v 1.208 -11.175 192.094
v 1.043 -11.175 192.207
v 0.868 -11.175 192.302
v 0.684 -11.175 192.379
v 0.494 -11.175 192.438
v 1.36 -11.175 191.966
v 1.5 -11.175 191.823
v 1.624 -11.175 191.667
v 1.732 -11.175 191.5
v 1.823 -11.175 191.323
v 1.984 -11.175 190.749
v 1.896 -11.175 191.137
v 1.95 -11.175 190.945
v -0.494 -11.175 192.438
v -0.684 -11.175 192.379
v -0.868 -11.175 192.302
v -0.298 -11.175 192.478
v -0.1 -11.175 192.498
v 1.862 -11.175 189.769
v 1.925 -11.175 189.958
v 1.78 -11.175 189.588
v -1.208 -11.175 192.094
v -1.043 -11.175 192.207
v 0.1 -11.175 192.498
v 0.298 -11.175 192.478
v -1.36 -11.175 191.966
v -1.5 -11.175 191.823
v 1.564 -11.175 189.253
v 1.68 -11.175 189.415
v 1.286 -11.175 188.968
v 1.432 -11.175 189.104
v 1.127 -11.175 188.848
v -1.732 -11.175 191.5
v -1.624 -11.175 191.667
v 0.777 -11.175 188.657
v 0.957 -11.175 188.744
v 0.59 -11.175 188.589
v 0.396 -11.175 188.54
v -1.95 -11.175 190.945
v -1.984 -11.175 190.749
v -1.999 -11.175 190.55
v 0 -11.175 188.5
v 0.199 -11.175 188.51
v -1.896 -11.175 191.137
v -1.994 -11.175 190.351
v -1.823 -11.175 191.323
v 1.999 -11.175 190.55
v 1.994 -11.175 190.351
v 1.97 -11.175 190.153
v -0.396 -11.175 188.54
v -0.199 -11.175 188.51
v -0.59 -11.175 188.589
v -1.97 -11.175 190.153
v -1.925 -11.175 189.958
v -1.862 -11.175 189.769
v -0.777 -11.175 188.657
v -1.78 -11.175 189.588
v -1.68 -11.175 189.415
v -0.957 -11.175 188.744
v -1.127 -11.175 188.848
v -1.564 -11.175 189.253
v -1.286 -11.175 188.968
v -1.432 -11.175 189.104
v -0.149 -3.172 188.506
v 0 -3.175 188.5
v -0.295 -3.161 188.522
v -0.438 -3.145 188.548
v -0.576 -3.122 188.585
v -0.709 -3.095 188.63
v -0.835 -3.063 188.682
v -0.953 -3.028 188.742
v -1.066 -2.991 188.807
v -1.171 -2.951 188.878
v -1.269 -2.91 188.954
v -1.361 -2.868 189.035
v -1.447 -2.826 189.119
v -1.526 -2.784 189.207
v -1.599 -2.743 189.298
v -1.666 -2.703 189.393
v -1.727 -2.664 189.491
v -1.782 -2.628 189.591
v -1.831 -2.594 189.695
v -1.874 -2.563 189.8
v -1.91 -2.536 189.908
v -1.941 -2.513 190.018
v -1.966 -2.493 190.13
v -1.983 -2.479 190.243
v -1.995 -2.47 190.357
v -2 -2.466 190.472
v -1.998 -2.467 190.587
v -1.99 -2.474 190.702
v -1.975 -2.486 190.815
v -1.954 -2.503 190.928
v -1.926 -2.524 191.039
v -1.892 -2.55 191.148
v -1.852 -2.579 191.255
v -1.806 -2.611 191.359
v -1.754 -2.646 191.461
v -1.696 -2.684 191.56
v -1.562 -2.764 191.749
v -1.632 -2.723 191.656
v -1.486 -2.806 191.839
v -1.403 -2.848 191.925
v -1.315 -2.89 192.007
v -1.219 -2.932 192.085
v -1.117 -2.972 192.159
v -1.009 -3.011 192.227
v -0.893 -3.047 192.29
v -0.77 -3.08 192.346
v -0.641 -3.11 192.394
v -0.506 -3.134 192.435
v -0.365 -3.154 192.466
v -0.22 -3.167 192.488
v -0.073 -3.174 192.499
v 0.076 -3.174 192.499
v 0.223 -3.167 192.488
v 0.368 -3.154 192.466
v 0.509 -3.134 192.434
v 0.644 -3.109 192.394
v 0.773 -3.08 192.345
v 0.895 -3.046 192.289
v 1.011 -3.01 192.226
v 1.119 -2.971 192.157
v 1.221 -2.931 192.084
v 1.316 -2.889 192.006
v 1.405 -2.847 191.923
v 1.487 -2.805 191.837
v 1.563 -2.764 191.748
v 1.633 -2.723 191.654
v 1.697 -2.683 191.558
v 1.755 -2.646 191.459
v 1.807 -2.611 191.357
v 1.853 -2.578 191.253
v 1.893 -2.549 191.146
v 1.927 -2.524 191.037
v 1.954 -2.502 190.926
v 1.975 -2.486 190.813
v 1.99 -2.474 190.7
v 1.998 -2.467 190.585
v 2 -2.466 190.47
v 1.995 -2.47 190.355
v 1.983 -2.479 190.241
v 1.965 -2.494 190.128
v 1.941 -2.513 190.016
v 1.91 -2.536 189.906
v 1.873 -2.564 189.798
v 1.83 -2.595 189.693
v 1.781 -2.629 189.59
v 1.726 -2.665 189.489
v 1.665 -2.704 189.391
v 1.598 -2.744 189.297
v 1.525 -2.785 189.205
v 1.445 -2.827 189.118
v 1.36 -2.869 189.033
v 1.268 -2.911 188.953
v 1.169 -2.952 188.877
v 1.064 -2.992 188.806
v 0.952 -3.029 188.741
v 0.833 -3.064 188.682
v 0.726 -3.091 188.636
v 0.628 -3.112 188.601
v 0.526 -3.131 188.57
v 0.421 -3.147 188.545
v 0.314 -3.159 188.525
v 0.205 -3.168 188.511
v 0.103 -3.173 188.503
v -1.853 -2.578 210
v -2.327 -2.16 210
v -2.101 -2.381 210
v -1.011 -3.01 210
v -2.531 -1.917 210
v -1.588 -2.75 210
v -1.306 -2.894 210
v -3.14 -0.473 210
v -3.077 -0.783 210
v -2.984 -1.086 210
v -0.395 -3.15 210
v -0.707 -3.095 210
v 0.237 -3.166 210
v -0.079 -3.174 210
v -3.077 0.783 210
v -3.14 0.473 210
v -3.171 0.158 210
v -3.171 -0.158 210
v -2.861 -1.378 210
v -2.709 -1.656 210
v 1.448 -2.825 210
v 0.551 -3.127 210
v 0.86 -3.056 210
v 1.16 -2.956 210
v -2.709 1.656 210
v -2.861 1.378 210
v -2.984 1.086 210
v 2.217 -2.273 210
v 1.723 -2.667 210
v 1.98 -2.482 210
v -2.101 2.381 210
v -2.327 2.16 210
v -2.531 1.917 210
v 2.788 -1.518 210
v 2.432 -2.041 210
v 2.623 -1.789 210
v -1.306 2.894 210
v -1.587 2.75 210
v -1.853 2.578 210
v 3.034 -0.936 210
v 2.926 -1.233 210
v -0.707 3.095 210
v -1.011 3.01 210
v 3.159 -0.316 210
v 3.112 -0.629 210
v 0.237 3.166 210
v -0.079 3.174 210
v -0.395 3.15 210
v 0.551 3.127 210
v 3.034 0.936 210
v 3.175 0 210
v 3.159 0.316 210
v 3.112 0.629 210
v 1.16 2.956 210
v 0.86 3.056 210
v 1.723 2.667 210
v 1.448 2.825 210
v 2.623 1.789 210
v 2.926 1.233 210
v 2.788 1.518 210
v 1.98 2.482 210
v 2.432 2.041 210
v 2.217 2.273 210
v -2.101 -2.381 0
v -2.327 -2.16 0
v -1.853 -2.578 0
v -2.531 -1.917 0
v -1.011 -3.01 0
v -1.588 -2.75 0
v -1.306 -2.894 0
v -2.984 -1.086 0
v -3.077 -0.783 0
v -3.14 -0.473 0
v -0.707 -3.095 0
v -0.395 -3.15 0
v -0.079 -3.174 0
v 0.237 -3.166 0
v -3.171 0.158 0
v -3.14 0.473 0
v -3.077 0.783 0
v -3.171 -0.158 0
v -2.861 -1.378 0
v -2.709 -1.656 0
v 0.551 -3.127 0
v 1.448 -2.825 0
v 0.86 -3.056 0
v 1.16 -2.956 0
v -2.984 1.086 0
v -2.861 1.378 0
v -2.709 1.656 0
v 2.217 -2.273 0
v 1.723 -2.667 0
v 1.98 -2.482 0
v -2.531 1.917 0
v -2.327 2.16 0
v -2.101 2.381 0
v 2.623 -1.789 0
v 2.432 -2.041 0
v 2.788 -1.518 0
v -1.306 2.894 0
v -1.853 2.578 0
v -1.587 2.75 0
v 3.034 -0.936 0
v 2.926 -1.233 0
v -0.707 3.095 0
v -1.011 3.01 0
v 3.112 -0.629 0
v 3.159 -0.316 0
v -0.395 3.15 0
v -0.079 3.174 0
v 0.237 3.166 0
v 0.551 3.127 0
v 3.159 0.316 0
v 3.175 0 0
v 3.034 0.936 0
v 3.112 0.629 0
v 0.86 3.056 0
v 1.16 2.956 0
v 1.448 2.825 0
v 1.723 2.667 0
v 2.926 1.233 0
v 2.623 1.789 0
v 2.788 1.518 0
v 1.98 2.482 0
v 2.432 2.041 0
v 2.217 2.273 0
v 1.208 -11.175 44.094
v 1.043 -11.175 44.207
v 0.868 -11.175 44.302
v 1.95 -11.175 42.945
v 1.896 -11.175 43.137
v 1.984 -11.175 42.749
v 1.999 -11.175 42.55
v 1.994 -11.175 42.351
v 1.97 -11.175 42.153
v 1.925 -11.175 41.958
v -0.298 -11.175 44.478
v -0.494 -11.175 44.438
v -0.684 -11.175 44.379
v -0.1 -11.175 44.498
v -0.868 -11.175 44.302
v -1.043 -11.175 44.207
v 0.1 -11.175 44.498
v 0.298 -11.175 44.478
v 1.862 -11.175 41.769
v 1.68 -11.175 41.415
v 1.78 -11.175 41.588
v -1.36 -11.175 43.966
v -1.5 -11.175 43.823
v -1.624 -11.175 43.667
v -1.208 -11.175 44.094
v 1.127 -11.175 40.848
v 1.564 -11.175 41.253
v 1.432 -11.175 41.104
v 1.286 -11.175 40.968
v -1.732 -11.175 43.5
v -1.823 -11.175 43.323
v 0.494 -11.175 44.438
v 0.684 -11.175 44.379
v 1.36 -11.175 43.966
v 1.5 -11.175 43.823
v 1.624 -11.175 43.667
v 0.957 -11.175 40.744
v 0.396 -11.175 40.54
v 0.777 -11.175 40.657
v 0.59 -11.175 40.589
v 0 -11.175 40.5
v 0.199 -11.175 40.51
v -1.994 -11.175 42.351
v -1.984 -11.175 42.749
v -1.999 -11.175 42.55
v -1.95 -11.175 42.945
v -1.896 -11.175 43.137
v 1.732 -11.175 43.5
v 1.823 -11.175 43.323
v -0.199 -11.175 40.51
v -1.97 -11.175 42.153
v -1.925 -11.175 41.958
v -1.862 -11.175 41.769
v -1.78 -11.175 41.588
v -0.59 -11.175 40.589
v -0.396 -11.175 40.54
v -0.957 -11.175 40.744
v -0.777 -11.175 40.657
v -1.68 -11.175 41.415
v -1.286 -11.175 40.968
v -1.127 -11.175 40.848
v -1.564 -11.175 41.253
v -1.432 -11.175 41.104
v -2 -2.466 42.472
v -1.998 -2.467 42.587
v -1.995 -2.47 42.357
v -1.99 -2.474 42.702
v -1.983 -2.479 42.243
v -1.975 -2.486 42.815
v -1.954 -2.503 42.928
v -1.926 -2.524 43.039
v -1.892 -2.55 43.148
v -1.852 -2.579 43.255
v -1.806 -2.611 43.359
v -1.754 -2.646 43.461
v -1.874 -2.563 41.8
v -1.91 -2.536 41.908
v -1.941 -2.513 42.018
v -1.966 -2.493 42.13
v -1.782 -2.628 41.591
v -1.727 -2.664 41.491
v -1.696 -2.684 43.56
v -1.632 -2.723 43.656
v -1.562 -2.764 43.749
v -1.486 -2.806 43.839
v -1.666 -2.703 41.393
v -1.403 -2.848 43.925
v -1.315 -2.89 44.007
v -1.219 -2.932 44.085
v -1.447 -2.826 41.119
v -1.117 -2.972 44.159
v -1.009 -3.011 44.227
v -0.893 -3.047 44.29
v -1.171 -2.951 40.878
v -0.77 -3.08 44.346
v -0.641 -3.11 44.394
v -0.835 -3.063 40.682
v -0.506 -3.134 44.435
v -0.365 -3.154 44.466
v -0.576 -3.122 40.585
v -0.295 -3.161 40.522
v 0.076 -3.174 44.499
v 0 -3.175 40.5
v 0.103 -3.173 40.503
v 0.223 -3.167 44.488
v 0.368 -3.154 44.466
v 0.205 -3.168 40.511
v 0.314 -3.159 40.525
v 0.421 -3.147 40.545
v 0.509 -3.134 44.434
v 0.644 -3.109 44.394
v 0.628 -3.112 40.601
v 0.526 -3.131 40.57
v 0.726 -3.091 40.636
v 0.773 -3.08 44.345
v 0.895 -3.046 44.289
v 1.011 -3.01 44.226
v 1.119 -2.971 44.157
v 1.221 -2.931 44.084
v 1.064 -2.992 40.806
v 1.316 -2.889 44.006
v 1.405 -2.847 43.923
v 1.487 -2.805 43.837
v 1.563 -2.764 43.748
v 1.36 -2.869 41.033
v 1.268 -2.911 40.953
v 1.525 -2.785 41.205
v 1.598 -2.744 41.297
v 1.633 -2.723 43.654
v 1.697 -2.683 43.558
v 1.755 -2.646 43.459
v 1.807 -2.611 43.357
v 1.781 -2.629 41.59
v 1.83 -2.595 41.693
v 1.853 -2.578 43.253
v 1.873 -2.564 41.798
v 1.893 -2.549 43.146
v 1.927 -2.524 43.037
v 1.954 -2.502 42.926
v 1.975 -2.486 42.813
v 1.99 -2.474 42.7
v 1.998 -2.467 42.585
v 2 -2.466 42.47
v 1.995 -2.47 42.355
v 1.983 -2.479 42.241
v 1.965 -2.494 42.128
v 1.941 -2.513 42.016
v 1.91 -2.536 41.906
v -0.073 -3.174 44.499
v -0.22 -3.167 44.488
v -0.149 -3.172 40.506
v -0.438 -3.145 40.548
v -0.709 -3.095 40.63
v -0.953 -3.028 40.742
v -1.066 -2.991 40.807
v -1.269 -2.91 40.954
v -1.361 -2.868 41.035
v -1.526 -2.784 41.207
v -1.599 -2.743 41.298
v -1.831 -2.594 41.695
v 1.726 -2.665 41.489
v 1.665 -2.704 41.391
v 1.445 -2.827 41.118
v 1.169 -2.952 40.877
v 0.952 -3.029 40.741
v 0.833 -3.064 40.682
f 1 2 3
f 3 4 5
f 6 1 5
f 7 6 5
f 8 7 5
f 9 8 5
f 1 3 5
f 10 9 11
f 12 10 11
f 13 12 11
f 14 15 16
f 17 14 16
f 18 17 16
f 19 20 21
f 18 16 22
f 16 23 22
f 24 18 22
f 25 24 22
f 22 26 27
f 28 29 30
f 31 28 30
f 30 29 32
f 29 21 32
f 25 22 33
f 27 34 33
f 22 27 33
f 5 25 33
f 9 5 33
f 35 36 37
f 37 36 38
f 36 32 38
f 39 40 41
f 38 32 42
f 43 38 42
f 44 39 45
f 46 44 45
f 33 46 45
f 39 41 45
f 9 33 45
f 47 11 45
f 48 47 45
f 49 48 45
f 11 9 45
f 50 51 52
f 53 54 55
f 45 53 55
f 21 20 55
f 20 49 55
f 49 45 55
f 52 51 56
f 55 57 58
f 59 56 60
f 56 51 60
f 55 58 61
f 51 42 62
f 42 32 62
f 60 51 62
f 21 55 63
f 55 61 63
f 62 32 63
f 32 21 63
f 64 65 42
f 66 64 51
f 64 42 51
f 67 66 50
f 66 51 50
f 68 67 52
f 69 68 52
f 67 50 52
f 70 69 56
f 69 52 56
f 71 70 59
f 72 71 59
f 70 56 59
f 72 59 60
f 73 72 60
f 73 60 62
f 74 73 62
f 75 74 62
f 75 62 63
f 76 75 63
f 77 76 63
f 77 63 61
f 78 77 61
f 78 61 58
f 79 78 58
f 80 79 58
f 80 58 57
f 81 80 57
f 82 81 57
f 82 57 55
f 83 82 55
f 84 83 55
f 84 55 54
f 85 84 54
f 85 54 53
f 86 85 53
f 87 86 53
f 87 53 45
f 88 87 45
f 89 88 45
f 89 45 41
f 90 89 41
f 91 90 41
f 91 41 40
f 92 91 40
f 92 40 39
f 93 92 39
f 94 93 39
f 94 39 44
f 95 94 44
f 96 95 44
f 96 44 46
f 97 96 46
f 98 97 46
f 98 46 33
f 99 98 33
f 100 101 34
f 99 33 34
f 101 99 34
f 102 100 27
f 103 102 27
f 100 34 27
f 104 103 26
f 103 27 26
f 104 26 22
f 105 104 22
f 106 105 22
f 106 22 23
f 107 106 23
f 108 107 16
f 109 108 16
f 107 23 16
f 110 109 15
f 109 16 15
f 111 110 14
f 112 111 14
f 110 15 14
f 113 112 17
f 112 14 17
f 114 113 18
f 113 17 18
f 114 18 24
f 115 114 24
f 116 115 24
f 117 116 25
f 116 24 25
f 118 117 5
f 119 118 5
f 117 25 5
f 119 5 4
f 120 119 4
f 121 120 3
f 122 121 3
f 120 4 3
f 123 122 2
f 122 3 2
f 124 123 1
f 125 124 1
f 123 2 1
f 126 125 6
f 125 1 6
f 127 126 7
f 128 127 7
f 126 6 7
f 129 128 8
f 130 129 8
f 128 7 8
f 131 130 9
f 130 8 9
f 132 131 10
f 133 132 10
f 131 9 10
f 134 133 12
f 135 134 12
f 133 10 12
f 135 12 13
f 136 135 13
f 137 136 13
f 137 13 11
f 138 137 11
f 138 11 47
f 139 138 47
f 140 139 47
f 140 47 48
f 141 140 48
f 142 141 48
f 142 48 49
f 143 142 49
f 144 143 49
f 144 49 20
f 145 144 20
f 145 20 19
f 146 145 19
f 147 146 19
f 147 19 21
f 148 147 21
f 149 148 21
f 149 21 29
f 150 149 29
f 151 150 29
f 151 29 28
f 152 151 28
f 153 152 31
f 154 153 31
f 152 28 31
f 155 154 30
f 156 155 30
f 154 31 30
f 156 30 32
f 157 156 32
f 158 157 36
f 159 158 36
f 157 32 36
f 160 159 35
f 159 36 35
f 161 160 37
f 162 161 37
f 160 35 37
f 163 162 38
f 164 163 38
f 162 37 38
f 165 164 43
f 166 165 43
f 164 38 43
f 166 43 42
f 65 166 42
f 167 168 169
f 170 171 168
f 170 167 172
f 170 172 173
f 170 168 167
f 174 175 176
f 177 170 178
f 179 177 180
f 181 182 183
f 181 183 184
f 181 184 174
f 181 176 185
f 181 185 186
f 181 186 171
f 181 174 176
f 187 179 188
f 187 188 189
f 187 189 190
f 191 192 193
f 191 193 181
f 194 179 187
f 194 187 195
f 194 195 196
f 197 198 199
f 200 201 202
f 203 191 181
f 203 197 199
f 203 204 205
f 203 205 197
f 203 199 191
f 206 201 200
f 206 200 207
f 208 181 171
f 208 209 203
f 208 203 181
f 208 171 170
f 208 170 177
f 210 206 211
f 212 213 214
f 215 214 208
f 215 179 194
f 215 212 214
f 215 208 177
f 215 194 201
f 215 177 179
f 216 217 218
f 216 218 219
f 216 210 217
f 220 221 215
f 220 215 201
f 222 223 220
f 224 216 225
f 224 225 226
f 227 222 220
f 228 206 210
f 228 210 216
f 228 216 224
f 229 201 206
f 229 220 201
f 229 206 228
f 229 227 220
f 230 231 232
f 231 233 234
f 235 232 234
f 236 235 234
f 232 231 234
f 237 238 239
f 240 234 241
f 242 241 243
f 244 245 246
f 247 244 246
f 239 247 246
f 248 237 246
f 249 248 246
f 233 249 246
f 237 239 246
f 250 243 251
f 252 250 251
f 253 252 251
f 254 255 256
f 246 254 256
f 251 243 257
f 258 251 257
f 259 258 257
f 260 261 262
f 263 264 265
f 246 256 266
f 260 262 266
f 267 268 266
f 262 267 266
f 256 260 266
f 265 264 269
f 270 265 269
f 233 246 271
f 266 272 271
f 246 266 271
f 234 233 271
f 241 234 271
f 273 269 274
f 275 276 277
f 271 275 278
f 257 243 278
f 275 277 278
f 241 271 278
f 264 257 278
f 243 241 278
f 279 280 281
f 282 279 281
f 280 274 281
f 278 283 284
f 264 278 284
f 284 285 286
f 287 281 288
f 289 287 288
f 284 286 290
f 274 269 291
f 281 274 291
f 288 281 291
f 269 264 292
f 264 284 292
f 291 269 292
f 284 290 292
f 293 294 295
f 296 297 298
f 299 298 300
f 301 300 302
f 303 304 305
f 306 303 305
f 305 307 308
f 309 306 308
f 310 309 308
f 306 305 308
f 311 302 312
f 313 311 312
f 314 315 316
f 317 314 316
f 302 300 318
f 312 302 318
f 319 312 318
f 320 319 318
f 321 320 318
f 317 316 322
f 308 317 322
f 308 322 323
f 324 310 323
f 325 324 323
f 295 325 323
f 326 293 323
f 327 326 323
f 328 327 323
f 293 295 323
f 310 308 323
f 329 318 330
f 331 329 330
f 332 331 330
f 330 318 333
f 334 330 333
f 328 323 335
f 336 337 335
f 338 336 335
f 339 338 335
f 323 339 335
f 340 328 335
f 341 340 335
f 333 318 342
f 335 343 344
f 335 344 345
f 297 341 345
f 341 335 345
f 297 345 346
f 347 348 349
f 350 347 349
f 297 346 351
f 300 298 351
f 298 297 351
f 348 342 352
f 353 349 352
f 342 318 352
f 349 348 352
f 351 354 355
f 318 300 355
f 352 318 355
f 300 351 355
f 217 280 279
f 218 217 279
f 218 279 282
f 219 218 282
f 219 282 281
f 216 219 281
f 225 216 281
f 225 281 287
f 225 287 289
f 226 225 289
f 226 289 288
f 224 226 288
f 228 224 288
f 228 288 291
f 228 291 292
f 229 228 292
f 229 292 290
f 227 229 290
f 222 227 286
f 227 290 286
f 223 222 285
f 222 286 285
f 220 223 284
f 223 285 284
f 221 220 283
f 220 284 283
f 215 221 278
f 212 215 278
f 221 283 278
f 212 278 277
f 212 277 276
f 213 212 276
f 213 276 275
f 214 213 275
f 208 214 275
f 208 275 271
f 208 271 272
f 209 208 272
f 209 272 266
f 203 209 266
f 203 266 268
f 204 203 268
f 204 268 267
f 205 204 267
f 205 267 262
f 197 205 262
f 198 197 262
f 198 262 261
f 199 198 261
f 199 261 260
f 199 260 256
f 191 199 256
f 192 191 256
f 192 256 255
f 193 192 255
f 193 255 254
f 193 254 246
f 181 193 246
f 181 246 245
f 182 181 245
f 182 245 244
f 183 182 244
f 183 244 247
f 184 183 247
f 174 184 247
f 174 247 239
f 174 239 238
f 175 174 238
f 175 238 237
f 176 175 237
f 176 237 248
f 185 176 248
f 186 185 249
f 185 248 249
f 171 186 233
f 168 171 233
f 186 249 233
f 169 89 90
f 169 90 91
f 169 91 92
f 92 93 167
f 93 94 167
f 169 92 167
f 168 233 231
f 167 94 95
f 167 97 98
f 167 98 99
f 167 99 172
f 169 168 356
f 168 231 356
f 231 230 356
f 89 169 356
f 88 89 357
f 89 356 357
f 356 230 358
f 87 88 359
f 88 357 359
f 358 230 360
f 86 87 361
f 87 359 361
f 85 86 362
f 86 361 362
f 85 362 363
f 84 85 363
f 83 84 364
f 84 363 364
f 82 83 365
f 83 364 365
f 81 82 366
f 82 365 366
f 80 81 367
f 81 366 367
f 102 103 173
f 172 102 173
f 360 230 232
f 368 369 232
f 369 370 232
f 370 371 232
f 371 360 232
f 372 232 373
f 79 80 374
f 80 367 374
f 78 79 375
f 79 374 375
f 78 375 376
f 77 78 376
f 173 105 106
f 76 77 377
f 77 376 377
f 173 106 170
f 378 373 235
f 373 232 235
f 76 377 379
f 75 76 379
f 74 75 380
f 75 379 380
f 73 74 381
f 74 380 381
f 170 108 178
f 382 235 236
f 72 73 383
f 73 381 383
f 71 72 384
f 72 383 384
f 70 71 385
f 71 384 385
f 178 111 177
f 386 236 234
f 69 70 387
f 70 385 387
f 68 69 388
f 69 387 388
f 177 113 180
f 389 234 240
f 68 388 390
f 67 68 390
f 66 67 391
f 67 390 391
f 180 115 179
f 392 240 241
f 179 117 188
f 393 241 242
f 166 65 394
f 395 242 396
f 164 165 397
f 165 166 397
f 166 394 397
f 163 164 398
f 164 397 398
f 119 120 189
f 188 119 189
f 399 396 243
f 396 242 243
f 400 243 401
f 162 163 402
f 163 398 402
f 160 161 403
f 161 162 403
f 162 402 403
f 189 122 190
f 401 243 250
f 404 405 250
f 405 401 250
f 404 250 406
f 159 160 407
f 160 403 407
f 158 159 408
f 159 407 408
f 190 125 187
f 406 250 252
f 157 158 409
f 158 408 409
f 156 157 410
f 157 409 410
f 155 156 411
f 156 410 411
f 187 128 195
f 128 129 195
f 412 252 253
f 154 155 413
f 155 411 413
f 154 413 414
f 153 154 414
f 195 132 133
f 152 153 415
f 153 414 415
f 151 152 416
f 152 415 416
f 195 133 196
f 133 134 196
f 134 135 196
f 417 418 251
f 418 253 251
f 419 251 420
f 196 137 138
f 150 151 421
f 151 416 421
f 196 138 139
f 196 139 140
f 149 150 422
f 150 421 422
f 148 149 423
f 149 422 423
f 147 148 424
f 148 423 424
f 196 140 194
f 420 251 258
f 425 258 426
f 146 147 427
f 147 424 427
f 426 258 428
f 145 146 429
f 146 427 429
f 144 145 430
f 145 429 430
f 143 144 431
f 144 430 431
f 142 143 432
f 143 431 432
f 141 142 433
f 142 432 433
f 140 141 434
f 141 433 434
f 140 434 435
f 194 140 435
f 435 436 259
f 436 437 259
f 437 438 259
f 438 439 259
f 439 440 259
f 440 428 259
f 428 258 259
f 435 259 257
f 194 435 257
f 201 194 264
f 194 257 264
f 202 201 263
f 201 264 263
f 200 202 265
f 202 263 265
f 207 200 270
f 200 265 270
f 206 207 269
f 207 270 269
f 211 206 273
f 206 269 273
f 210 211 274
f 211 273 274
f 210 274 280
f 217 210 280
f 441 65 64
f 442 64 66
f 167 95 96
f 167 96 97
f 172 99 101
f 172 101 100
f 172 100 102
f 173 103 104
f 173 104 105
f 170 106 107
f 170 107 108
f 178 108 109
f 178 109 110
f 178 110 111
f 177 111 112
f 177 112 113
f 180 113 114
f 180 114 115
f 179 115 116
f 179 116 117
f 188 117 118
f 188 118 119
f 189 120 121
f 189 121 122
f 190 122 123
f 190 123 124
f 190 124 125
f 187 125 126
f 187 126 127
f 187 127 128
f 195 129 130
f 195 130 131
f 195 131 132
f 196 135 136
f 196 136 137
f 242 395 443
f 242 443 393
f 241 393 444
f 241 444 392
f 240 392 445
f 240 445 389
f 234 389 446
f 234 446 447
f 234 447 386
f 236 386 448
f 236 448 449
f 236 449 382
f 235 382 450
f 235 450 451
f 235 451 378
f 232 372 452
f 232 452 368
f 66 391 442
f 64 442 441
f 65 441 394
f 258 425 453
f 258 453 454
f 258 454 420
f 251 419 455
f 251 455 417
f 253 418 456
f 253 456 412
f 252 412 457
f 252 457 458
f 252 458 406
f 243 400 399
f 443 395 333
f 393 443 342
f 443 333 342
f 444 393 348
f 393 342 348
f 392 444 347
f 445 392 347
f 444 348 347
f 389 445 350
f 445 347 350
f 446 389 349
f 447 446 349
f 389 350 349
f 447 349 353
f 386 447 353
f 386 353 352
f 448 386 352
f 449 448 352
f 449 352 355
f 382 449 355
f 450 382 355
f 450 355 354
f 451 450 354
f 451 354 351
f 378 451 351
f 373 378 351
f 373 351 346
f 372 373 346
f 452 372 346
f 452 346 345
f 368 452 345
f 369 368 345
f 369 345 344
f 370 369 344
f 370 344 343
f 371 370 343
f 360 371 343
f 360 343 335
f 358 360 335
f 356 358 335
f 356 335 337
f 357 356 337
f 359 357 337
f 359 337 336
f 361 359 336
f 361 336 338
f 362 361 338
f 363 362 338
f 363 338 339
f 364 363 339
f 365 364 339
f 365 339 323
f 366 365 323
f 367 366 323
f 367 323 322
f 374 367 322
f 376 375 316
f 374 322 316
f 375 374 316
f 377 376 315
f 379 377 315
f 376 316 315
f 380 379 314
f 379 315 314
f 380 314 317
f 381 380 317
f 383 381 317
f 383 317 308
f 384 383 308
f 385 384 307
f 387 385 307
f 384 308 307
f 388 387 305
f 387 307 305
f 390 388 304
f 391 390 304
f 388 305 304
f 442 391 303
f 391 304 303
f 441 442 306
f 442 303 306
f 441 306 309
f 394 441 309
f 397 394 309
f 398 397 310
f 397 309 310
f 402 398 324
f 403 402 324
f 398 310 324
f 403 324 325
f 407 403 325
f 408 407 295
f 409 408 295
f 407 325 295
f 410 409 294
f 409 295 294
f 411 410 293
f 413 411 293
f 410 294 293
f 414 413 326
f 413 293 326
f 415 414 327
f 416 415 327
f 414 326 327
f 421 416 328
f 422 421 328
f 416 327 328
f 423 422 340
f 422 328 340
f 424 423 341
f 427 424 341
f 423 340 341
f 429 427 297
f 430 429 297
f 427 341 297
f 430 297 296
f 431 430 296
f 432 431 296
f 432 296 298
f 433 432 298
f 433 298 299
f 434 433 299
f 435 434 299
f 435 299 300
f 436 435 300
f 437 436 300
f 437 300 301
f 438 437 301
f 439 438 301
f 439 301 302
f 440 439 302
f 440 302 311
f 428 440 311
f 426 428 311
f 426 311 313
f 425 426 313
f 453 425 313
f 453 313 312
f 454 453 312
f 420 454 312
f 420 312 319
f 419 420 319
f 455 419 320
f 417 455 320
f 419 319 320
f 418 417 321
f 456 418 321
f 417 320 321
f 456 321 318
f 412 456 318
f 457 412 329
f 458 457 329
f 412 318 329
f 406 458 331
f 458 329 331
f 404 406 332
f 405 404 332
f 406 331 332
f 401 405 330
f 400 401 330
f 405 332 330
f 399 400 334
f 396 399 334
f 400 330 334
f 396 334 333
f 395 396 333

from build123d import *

# Parameters (mm, degrees)
SKETCH1_R           = 3.175
BOSS_EXTRUDE1_DEPTH = 210
BOSS_EXTRUDE2_START = -11.175
SKETCH2_R           = 2
BOSS_EXTRUDE2_DEPTH = 9.175


with BuildPart() as part:
    # Sketch1 → Boss-Extrude1 (new body)
    with BuildSketch(Plane.XY):
        Circle(SKETCH1_R)
    extrude(amount=BOSS_EXTRUDE1_DEPTH)

    # Sketch2 → Boss-Extrude2 (add)
    with BuildSketch(Plane(origin=(0, 0, 0), x_dir=(1, 0, 0), z_dir=(0, 1, 0)).offset(BOSS_EXTRUDE2_START)):
        with Locations(Location((0, -42.5, 0), (0, 0, 90))):
            Circle(SKETCH2_R)
        with Locations(Location((0, -190.5, 0), (0, 0, 90))):
            Circle(SKETCH2_R)
    extrude(amount=BOSS_EXTRUDE2_DEPTH)


solid = part.part
